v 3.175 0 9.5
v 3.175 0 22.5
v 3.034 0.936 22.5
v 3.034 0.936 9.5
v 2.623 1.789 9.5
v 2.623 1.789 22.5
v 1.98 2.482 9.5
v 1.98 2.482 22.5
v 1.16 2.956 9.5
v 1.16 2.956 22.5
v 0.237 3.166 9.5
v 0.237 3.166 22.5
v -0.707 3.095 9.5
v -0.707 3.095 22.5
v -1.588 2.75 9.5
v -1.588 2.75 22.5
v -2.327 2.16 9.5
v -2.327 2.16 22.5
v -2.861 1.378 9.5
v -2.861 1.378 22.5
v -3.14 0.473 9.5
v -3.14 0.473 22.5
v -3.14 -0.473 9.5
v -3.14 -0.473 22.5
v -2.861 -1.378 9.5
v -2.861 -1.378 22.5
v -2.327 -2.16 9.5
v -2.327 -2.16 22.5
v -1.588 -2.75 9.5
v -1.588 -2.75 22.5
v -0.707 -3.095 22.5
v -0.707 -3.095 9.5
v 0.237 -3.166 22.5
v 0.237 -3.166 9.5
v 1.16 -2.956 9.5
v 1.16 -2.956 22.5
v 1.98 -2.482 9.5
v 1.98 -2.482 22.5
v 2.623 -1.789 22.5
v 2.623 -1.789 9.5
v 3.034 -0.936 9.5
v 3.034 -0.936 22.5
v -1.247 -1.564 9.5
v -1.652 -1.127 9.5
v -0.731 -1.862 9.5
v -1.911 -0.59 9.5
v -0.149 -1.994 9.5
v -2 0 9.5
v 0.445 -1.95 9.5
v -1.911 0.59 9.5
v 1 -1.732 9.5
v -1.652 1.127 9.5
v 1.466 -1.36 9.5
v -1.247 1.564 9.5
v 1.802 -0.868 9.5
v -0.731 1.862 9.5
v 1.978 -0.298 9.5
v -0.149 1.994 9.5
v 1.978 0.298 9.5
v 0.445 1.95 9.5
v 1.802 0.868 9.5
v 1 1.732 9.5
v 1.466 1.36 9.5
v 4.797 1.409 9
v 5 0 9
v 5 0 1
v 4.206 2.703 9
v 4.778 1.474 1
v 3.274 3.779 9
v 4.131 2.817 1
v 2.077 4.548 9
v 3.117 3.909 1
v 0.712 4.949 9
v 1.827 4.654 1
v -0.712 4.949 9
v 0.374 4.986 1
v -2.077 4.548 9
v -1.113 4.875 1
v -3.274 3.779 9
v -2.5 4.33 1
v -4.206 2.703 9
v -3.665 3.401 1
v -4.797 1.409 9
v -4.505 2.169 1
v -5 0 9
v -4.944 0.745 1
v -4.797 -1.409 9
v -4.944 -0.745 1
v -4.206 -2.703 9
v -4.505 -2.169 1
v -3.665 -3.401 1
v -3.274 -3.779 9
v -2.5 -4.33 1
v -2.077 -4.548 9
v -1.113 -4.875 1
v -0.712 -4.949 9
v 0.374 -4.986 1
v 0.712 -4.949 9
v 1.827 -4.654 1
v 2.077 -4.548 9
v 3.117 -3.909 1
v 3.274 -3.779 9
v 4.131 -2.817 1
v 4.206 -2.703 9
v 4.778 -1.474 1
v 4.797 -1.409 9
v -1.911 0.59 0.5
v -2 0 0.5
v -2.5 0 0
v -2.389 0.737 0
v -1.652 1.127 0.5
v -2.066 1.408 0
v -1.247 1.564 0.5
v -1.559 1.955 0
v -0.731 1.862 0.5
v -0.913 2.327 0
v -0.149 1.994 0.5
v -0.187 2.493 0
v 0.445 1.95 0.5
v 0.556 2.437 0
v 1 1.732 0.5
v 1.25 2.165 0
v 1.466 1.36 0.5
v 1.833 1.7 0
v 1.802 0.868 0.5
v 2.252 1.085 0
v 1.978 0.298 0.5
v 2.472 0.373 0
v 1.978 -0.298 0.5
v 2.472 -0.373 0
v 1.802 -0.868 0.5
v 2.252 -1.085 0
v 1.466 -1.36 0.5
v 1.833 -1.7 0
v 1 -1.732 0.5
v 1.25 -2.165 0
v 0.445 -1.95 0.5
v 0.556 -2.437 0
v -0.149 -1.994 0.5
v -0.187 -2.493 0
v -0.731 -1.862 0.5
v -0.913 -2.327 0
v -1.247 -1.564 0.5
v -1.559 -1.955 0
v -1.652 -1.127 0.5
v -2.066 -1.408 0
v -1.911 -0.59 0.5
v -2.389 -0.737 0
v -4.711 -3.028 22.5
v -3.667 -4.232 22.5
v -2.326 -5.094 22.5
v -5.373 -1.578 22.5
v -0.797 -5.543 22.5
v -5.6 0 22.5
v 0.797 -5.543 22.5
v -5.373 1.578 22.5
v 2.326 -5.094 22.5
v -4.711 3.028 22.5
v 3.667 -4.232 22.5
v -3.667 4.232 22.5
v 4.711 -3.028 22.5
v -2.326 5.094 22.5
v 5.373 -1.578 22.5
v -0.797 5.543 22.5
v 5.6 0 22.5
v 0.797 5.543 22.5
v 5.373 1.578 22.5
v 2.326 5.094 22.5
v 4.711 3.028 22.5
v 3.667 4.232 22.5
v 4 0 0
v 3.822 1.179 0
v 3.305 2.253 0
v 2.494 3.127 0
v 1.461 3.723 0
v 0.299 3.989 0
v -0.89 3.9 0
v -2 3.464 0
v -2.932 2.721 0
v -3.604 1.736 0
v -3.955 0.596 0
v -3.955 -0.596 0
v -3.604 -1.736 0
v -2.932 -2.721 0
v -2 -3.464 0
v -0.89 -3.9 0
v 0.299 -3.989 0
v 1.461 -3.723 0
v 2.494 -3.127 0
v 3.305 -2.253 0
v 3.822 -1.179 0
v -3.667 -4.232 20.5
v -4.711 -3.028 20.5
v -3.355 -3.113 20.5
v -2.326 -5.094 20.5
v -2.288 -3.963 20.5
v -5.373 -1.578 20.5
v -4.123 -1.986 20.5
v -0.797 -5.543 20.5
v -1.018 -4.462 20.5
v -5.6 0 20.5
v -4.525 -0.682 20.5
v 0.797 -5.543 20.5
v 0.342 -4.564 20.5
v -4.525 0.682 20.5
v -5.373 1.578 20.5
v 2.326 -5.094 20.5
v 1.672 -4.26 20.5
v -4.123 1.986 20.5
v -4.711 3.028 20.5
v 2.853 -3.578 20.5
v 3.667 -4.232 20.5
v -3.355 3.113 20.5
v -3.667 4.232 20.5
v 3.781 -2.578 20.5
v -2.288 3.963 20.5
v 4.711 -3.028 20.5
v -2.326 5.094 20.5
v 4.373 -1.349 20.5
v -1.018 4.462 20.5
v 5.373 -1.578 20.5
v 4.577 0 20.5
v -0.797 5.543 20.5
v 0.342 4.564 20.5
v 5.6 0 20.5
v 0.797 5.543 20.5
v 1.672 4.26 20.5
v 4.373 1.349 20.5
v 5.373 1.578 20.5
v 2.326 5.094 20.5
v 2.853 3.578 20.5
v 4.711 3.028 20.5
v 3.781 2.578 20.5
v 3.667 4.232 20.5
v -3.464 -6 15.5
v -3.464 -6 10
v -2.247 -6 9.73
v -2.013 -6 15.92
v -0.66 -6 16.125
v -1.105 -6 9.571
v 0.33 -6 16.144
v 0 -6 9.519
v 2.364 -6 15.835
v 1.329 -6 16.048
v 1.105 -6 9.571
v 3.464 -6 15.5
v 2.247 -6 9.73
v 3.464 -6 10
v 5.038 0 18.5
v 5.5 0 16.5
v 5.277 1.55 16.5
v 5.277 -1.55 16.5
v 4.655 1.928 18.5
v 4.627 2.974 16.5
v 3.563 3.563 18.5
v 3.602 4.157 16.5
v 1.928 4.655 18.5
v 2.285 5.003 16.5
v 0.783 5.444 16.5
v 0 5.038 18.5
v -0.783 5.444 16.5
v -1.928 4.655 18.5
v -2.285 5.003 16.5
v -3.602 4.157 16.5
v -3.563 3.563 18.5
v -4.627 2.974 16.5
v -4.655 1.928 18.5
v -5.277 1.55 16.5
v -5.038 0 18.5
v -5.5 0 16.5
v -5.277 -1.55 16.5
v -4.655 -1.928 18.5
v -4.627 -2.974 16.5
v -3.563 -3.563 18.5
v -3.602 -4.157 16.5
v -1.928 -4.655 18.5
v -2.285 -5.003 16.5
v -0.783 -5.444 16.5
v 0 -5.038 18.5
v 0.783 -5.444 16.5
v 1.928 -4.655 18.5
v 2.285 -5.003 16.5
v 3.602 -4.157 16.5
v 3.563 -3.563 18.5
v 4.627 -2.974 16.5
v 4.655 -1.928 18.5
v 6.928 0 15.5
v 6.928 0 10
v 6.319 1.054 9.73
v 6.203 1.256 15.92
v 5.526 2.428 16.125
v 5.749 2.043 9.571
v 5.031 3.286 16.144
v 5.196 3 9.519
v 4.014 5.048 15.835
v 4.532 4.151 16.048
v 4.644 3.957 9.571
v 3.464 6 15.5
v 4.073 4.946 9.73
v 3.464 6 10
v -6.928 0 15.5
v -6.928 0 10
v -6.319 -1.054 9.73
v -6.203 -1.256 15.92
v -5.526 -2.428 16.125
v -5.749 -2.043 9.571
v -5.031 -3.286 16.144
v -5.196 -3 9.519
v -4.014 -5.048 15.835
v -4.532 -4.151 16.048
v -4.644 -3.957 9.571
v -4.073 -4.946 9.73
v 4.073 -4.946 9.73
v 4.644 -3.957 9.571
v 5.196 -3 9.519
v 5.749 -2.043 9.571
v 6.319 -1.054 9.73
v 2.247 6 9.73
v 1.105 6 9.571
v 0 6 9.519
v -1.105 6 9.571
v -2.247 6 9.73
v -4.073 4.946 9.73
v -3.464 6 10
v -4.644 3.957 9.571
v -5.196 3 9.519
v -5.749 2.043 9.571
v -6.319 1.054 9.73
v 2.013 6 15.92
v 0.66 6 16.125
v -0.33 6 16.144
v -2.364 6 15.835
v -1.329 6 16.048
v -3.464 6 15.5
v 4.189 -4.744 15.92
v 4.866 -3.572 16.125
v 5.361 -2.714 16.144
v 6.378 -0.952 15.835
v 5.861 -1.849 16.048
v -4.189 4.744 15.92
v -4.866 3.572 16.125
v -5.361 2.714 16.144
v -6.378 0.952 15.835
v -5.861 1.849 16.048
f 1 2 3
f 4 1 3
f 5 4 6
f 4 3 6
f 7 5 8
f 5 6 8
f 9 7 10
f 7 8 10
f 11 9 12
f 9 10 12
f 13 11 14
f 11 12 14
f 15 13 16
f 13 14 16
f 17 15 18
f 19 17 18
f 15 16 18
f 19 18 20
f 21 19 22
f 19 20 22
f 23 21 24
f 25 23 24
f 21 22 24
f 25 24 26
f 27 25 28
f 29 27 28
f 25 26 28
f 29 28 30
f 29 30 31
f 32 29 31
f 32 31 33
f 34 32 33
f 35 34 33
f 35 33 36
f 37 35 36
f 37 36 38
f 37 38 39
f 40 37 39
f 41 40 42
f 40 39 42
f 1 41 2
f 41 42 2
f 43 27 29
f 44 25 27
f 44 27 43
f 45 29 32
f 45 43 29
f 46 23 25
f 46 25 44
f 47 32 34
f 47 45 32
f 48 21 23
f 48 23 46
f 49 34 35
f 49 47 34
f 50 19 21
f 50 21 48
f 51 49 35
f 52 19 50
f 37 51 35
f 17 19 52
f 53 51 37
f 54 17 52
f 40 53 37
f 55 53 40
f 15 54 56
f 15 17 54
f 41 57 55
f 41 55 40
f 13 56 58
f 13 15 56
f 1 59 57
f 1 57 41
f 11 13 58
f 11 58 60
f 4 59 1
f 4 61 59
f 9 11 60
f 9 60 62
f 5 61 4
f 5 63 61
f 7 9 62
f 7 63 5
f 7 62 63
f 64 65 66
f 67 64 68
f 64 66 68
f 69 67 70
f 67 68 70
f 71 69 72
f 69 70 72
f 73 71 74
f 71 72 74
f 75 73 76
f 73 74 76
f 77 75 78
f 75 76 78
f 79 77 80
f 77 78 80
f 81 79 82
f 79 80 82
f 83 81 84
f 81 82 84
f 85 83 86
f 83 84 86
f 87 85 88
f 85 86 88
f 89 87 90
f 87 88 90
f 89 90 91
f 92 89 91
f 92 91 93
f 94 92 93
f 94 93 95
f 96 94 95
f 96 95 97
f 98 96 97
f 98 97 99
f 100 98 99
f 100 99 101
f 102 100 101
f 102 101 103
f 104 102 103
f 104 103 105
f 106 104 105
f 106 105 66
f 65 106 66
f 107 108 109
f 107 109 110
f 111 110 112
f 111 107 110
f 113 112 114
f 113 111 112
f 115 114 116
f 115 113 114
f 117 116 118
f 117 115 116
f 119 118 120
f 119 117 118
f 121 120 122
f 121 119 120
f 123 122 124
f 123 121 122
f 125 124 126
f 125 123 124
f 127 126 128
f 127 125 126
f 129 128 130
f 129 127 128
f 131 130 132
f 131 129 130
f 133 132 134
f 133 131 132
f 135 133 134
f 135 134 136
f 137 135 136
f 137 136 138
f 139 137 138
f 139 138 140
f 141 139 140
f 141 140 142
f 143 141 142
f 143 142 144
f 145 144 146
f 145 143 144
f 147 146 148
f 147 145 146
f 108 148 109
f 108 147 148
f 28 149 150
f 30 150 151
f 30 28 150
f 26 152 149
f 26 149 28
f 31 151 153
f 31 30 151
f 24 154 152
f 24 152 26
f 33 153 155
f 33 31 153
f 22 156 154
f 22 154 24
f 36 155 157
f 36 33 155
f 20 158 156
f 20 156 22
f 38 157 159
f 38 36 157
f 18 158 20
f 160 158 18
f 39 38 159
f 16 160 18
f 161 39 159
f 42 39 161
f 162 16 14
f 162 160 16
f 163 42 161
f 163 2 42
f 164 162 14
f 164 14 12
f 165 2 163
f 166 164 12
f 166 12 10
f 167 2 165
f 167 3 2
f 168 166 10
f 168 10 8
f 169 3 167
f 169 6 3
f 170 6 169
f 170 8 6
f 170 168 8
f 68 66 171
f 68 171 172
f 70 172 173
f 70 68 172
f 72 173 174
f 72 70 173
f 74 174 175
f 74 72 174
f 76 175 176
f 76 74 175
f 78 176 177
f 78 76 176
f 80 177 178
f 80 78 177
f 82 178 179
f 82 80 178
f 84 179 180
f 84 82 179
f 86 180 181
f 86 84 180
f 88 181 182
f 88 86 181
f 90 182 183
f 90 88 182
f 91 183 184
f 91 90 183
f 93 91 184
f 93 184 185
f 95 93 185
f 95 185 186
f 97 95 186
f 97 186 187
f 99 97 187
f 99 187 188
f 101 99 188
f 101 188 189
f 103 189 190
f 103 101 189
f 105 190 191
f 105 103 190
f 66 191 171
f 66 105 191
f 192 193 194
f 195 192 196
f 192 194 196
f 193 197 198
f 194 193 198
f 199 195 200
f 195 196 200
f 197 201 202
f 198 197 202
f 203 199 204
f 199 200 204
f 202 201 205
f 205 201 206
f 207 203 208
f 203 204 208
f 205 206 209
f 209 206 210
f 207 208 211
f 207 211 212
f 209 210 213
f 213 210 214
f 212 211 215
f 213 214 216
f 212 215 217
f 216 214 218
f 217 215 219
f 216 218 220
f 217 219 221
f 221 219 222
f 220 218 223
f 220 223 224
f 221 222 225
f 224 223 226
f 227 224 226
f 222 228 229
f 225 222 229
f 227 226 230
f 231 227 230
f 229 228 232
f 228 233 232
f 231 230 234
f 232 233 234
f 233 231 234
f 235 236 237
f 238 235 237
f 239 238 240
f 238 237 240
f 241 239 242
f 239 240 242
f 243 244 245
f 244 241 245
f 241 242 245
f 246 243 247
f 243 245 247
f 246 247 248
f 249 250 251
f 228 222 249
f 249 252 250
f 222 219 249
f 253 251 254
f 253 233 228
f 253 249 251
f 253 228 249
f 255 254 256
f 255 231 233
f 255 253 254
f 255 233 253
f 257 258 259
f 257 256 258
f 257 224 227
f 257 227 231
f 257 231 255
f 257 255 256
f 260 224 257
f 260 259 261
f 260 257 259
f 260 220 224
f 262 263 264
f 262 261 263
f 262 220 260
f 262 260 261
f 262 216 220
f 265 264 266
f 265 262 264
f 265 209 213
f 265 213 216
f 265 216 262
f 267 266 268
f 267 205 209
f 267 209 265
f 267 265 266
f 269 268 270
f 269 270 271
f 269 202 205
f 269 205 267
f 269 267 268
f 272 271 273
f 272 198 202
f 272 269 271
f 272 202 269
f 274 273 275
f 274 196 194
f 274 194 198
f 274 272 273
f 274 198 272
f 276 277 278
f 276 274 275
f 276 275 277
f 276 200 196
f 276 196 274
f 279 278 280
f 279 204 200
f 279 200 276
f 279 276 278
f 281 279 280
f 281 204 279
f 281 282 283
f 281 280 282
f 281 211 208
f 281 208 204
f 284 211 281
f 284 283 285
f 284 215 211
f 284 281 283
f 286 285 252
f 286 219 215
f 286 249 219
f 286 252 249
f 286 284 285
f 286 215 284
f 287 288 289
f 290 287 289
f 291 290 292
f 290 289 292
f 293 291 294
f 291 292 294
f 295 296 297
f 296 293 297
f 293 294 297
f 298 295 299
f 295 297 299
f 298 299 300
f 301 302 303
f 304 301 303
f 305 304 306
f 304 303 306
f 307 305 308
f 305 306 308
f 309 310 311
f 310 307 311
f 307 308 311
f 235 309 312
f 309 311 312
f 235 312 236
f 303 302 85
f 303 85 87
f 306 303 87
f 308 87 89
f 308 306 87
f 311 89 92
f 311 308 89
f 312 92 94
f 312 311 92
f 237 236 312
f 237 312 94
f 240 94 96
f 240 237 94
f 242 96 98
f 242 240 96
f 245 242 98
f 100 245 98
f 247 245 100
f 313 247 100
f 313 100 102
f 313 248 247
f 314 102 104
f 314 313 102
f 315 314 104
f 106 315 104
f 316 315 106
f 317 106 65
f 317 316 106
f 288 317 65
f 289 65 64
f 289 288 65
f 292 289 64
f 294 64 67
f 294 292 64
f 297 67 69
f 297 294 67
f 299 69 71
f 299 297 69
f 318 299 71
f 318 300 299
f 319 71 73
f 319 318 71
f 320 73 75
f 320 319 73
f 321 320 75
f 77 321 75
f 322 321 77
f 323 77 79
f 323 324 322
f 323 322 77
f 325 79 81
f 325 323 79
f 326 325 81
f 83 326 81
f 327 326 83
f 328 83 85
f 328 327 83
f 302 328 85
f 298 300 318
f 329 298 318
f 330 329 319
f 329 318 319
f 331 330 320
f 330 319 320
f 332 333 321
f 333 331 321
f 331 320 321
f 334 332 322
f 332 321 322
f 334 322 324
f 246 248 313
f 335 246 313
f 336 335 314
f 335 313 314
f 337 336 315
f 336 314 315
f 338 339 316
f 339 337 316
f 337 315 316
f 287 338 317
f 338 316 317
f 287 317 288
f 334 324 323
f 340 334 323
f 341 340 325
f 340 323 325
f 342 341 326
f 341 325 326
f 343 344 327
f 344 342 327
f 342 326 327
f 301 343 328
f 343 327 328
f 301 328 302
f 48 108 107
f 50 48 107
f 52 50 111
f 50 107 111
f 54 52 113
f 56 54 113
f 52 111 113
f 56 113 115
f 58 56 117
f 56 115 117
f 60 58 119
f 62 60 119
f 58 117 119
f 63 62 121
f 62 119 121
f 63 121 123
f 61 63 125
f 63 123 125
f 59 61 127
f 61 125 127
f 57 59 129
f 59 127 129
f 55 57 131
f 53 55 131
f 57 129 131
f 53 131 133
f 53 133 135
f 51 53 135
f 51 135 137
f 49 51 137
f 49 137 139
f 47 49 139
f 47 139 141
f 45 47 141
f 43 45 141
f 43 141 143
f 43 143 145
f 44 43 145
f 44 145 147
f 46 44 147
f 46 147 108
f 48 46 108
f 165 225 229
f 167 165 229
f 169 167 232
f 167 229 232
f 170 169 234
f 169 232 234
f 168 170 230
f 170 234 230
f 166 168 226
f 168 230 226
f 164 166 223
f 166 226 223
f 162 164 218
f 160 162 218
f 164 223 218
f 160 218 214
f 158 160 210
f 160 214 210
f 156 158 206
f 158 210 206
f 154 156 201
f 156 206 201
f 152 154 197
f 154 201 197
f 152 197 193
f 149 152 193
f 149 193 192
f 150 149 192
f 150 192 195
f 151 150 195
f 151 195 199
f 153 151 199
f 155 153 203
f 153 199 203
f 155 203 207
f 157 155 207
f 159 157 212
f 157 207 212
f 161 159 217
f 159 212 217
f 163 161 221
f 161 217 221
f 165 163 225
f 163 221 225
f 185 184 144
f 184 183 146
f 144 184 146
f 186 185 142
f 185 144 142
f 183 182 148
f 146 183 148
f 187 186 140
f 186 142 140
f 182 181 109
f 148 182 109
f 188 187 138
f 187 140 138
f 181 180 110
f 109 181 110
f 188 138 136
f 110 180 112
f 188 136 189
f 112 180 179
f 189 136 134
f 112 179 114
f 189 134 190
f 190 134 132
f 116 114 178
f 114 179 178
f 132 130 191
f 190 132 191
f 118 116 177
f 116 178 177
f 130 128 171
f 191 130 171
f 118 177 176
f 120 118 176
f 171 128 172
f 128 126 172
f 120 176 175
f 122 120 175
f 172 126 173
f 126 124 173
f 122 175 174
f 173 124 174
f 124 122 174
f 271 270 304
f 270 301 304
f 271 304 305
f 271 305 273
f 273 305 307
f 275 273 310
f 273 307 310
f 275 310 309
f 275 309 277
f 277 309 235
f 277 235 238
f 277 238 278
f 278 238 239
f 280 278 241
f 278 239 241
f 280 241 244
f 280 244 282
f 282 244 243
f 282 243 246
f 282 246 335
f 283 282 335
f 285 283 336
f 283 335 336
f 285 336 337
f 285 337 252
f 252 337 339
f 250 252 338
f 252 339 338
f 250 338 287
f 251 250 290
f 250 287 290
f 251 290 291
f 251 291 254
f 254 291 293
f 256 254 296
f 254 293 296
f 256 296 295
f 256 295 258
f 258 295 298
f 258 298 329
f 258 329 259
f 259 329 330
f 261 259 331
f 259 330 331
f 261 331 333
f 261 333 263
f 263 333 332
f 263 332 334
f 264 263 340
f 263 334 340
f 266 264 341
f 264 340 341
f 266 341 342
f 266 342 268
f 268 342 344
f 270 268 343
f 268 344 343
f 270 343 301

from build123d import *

# Parameters (mm, degrees)
SKETCH1_R           = 5
BOSS_EXTRUDE1_DEPTH = 9
BOSS_EXTRUDE2_DEPTH = 7.5
SKETCH3_R           = 5.5
BOSS_EXTRUDE3_DEPTH = 4
BOSS_EXTRUDE3_TAPER = 13
SKETCH4_R           = 5.6
BOSS_EXTRUDE4_DEPTH = 2
SKETCH5_R           = 3.175
CUT_EXTRUDE1_DEPTH  = 13
SKETCH6_R           = 2
CUT_EXTRUDE2_DEPTH  = 25.295061227
CHAMFER1_SIZE       = 1
CHAMFER2_SIZE       = 0.5


with BuildPart() as part:
    # Sketch1 → Boss-Extrude1 (new body)
    with BuildSketch(Plane.XY):
        Circle(SKETCH1_R)
    extrude(amount=BOSS_EXTRUDE1_DEPTH)

    # Sketch2 → Boss-Extrude2 (add)
    with BuildSketch(Plane.XY.offset(9)):
        Polygon((6.92820323, 0), (3.464101615, 6), (-3.464101615, 6), (-6.92820323, 0), (-3.464101615, -6), (3.464101615, -6), align=None)
    extrude(amount=BOSS_EXTRUDE2_DEPTH)

    # Sketch3 → Boss-Extrude3 (add)
    with BuildSketch(Plane.XY.offset(16.5)):
        Circle(SKETCH3_R)
    extrude(amount=BOSS_EXTRUDE3_DEPTH, taper=BOSS_EXTRUDE3_TAPER)

    # Sketch4 → Boss-Extrude4 (add)
    with BuildSketch(Plane.XY.offset(20.5)):
        Circle(SKETCH4_R)
    extrude(amount=BOSS_EXTRUDE4_DEPTH)

    # Sketch5 → Cut-Extrude1 (cut)
    with BuildSketch(Plane.XY.offset(22.5)):
        Circle(SKETCH5_R)
    extrude(amount=-CUT_EXTRUDE1_DEPTH, mode=Mode.SUBTRACT)

    # Sketch6 → Cut-Extrude2 (cut, through all)
    with BuildSketch(Plane(origin=(0, 0, 0), x_dir=(-1, 0, 0), z_dir=(0, 0, -1))):
        Circle(SKETCH6_R)
    extrude(amount=-CUT_EXTRUDE2_DEPTH, mode=Mode.SUBTRACT)

    # Sketch7 → Cut-Revolve1 (revolve, cut)
    with BuildSketch(Plane(origin=(0, 0, 0), x_dir=(1, 0, 0), z_dir=(0, 1, 0))):
        Polygon((5, -9), (6.92820323, -10), (6.92820323, -9), align=None)
        Polygon((6.92820323, -15.5), (6.92820323, -16.5), (5.5, -16.5), align=None)
    revolve(axis=Axis((0, 0, -1.125), (0, 0, 1)), mode=Mode.SUBTRACT)

    # Chamfer1
    chamfer1_edges = [part.edges().sort_by_distance(p)[0] for p in [
        (-5, 0, 0),
    ]]
    chamfer(chamfer1_edges, length=CHAMFER1_SIZE)

    # Chamfer2
    chamfer2_edges = [part.edges().sort_by_distance(p)[0] for p in [
        (2, 0, 0),
    ]]
    chamfer(chamfer2_edges, length=CHAMFER2_SIZE)


solid = part.part
